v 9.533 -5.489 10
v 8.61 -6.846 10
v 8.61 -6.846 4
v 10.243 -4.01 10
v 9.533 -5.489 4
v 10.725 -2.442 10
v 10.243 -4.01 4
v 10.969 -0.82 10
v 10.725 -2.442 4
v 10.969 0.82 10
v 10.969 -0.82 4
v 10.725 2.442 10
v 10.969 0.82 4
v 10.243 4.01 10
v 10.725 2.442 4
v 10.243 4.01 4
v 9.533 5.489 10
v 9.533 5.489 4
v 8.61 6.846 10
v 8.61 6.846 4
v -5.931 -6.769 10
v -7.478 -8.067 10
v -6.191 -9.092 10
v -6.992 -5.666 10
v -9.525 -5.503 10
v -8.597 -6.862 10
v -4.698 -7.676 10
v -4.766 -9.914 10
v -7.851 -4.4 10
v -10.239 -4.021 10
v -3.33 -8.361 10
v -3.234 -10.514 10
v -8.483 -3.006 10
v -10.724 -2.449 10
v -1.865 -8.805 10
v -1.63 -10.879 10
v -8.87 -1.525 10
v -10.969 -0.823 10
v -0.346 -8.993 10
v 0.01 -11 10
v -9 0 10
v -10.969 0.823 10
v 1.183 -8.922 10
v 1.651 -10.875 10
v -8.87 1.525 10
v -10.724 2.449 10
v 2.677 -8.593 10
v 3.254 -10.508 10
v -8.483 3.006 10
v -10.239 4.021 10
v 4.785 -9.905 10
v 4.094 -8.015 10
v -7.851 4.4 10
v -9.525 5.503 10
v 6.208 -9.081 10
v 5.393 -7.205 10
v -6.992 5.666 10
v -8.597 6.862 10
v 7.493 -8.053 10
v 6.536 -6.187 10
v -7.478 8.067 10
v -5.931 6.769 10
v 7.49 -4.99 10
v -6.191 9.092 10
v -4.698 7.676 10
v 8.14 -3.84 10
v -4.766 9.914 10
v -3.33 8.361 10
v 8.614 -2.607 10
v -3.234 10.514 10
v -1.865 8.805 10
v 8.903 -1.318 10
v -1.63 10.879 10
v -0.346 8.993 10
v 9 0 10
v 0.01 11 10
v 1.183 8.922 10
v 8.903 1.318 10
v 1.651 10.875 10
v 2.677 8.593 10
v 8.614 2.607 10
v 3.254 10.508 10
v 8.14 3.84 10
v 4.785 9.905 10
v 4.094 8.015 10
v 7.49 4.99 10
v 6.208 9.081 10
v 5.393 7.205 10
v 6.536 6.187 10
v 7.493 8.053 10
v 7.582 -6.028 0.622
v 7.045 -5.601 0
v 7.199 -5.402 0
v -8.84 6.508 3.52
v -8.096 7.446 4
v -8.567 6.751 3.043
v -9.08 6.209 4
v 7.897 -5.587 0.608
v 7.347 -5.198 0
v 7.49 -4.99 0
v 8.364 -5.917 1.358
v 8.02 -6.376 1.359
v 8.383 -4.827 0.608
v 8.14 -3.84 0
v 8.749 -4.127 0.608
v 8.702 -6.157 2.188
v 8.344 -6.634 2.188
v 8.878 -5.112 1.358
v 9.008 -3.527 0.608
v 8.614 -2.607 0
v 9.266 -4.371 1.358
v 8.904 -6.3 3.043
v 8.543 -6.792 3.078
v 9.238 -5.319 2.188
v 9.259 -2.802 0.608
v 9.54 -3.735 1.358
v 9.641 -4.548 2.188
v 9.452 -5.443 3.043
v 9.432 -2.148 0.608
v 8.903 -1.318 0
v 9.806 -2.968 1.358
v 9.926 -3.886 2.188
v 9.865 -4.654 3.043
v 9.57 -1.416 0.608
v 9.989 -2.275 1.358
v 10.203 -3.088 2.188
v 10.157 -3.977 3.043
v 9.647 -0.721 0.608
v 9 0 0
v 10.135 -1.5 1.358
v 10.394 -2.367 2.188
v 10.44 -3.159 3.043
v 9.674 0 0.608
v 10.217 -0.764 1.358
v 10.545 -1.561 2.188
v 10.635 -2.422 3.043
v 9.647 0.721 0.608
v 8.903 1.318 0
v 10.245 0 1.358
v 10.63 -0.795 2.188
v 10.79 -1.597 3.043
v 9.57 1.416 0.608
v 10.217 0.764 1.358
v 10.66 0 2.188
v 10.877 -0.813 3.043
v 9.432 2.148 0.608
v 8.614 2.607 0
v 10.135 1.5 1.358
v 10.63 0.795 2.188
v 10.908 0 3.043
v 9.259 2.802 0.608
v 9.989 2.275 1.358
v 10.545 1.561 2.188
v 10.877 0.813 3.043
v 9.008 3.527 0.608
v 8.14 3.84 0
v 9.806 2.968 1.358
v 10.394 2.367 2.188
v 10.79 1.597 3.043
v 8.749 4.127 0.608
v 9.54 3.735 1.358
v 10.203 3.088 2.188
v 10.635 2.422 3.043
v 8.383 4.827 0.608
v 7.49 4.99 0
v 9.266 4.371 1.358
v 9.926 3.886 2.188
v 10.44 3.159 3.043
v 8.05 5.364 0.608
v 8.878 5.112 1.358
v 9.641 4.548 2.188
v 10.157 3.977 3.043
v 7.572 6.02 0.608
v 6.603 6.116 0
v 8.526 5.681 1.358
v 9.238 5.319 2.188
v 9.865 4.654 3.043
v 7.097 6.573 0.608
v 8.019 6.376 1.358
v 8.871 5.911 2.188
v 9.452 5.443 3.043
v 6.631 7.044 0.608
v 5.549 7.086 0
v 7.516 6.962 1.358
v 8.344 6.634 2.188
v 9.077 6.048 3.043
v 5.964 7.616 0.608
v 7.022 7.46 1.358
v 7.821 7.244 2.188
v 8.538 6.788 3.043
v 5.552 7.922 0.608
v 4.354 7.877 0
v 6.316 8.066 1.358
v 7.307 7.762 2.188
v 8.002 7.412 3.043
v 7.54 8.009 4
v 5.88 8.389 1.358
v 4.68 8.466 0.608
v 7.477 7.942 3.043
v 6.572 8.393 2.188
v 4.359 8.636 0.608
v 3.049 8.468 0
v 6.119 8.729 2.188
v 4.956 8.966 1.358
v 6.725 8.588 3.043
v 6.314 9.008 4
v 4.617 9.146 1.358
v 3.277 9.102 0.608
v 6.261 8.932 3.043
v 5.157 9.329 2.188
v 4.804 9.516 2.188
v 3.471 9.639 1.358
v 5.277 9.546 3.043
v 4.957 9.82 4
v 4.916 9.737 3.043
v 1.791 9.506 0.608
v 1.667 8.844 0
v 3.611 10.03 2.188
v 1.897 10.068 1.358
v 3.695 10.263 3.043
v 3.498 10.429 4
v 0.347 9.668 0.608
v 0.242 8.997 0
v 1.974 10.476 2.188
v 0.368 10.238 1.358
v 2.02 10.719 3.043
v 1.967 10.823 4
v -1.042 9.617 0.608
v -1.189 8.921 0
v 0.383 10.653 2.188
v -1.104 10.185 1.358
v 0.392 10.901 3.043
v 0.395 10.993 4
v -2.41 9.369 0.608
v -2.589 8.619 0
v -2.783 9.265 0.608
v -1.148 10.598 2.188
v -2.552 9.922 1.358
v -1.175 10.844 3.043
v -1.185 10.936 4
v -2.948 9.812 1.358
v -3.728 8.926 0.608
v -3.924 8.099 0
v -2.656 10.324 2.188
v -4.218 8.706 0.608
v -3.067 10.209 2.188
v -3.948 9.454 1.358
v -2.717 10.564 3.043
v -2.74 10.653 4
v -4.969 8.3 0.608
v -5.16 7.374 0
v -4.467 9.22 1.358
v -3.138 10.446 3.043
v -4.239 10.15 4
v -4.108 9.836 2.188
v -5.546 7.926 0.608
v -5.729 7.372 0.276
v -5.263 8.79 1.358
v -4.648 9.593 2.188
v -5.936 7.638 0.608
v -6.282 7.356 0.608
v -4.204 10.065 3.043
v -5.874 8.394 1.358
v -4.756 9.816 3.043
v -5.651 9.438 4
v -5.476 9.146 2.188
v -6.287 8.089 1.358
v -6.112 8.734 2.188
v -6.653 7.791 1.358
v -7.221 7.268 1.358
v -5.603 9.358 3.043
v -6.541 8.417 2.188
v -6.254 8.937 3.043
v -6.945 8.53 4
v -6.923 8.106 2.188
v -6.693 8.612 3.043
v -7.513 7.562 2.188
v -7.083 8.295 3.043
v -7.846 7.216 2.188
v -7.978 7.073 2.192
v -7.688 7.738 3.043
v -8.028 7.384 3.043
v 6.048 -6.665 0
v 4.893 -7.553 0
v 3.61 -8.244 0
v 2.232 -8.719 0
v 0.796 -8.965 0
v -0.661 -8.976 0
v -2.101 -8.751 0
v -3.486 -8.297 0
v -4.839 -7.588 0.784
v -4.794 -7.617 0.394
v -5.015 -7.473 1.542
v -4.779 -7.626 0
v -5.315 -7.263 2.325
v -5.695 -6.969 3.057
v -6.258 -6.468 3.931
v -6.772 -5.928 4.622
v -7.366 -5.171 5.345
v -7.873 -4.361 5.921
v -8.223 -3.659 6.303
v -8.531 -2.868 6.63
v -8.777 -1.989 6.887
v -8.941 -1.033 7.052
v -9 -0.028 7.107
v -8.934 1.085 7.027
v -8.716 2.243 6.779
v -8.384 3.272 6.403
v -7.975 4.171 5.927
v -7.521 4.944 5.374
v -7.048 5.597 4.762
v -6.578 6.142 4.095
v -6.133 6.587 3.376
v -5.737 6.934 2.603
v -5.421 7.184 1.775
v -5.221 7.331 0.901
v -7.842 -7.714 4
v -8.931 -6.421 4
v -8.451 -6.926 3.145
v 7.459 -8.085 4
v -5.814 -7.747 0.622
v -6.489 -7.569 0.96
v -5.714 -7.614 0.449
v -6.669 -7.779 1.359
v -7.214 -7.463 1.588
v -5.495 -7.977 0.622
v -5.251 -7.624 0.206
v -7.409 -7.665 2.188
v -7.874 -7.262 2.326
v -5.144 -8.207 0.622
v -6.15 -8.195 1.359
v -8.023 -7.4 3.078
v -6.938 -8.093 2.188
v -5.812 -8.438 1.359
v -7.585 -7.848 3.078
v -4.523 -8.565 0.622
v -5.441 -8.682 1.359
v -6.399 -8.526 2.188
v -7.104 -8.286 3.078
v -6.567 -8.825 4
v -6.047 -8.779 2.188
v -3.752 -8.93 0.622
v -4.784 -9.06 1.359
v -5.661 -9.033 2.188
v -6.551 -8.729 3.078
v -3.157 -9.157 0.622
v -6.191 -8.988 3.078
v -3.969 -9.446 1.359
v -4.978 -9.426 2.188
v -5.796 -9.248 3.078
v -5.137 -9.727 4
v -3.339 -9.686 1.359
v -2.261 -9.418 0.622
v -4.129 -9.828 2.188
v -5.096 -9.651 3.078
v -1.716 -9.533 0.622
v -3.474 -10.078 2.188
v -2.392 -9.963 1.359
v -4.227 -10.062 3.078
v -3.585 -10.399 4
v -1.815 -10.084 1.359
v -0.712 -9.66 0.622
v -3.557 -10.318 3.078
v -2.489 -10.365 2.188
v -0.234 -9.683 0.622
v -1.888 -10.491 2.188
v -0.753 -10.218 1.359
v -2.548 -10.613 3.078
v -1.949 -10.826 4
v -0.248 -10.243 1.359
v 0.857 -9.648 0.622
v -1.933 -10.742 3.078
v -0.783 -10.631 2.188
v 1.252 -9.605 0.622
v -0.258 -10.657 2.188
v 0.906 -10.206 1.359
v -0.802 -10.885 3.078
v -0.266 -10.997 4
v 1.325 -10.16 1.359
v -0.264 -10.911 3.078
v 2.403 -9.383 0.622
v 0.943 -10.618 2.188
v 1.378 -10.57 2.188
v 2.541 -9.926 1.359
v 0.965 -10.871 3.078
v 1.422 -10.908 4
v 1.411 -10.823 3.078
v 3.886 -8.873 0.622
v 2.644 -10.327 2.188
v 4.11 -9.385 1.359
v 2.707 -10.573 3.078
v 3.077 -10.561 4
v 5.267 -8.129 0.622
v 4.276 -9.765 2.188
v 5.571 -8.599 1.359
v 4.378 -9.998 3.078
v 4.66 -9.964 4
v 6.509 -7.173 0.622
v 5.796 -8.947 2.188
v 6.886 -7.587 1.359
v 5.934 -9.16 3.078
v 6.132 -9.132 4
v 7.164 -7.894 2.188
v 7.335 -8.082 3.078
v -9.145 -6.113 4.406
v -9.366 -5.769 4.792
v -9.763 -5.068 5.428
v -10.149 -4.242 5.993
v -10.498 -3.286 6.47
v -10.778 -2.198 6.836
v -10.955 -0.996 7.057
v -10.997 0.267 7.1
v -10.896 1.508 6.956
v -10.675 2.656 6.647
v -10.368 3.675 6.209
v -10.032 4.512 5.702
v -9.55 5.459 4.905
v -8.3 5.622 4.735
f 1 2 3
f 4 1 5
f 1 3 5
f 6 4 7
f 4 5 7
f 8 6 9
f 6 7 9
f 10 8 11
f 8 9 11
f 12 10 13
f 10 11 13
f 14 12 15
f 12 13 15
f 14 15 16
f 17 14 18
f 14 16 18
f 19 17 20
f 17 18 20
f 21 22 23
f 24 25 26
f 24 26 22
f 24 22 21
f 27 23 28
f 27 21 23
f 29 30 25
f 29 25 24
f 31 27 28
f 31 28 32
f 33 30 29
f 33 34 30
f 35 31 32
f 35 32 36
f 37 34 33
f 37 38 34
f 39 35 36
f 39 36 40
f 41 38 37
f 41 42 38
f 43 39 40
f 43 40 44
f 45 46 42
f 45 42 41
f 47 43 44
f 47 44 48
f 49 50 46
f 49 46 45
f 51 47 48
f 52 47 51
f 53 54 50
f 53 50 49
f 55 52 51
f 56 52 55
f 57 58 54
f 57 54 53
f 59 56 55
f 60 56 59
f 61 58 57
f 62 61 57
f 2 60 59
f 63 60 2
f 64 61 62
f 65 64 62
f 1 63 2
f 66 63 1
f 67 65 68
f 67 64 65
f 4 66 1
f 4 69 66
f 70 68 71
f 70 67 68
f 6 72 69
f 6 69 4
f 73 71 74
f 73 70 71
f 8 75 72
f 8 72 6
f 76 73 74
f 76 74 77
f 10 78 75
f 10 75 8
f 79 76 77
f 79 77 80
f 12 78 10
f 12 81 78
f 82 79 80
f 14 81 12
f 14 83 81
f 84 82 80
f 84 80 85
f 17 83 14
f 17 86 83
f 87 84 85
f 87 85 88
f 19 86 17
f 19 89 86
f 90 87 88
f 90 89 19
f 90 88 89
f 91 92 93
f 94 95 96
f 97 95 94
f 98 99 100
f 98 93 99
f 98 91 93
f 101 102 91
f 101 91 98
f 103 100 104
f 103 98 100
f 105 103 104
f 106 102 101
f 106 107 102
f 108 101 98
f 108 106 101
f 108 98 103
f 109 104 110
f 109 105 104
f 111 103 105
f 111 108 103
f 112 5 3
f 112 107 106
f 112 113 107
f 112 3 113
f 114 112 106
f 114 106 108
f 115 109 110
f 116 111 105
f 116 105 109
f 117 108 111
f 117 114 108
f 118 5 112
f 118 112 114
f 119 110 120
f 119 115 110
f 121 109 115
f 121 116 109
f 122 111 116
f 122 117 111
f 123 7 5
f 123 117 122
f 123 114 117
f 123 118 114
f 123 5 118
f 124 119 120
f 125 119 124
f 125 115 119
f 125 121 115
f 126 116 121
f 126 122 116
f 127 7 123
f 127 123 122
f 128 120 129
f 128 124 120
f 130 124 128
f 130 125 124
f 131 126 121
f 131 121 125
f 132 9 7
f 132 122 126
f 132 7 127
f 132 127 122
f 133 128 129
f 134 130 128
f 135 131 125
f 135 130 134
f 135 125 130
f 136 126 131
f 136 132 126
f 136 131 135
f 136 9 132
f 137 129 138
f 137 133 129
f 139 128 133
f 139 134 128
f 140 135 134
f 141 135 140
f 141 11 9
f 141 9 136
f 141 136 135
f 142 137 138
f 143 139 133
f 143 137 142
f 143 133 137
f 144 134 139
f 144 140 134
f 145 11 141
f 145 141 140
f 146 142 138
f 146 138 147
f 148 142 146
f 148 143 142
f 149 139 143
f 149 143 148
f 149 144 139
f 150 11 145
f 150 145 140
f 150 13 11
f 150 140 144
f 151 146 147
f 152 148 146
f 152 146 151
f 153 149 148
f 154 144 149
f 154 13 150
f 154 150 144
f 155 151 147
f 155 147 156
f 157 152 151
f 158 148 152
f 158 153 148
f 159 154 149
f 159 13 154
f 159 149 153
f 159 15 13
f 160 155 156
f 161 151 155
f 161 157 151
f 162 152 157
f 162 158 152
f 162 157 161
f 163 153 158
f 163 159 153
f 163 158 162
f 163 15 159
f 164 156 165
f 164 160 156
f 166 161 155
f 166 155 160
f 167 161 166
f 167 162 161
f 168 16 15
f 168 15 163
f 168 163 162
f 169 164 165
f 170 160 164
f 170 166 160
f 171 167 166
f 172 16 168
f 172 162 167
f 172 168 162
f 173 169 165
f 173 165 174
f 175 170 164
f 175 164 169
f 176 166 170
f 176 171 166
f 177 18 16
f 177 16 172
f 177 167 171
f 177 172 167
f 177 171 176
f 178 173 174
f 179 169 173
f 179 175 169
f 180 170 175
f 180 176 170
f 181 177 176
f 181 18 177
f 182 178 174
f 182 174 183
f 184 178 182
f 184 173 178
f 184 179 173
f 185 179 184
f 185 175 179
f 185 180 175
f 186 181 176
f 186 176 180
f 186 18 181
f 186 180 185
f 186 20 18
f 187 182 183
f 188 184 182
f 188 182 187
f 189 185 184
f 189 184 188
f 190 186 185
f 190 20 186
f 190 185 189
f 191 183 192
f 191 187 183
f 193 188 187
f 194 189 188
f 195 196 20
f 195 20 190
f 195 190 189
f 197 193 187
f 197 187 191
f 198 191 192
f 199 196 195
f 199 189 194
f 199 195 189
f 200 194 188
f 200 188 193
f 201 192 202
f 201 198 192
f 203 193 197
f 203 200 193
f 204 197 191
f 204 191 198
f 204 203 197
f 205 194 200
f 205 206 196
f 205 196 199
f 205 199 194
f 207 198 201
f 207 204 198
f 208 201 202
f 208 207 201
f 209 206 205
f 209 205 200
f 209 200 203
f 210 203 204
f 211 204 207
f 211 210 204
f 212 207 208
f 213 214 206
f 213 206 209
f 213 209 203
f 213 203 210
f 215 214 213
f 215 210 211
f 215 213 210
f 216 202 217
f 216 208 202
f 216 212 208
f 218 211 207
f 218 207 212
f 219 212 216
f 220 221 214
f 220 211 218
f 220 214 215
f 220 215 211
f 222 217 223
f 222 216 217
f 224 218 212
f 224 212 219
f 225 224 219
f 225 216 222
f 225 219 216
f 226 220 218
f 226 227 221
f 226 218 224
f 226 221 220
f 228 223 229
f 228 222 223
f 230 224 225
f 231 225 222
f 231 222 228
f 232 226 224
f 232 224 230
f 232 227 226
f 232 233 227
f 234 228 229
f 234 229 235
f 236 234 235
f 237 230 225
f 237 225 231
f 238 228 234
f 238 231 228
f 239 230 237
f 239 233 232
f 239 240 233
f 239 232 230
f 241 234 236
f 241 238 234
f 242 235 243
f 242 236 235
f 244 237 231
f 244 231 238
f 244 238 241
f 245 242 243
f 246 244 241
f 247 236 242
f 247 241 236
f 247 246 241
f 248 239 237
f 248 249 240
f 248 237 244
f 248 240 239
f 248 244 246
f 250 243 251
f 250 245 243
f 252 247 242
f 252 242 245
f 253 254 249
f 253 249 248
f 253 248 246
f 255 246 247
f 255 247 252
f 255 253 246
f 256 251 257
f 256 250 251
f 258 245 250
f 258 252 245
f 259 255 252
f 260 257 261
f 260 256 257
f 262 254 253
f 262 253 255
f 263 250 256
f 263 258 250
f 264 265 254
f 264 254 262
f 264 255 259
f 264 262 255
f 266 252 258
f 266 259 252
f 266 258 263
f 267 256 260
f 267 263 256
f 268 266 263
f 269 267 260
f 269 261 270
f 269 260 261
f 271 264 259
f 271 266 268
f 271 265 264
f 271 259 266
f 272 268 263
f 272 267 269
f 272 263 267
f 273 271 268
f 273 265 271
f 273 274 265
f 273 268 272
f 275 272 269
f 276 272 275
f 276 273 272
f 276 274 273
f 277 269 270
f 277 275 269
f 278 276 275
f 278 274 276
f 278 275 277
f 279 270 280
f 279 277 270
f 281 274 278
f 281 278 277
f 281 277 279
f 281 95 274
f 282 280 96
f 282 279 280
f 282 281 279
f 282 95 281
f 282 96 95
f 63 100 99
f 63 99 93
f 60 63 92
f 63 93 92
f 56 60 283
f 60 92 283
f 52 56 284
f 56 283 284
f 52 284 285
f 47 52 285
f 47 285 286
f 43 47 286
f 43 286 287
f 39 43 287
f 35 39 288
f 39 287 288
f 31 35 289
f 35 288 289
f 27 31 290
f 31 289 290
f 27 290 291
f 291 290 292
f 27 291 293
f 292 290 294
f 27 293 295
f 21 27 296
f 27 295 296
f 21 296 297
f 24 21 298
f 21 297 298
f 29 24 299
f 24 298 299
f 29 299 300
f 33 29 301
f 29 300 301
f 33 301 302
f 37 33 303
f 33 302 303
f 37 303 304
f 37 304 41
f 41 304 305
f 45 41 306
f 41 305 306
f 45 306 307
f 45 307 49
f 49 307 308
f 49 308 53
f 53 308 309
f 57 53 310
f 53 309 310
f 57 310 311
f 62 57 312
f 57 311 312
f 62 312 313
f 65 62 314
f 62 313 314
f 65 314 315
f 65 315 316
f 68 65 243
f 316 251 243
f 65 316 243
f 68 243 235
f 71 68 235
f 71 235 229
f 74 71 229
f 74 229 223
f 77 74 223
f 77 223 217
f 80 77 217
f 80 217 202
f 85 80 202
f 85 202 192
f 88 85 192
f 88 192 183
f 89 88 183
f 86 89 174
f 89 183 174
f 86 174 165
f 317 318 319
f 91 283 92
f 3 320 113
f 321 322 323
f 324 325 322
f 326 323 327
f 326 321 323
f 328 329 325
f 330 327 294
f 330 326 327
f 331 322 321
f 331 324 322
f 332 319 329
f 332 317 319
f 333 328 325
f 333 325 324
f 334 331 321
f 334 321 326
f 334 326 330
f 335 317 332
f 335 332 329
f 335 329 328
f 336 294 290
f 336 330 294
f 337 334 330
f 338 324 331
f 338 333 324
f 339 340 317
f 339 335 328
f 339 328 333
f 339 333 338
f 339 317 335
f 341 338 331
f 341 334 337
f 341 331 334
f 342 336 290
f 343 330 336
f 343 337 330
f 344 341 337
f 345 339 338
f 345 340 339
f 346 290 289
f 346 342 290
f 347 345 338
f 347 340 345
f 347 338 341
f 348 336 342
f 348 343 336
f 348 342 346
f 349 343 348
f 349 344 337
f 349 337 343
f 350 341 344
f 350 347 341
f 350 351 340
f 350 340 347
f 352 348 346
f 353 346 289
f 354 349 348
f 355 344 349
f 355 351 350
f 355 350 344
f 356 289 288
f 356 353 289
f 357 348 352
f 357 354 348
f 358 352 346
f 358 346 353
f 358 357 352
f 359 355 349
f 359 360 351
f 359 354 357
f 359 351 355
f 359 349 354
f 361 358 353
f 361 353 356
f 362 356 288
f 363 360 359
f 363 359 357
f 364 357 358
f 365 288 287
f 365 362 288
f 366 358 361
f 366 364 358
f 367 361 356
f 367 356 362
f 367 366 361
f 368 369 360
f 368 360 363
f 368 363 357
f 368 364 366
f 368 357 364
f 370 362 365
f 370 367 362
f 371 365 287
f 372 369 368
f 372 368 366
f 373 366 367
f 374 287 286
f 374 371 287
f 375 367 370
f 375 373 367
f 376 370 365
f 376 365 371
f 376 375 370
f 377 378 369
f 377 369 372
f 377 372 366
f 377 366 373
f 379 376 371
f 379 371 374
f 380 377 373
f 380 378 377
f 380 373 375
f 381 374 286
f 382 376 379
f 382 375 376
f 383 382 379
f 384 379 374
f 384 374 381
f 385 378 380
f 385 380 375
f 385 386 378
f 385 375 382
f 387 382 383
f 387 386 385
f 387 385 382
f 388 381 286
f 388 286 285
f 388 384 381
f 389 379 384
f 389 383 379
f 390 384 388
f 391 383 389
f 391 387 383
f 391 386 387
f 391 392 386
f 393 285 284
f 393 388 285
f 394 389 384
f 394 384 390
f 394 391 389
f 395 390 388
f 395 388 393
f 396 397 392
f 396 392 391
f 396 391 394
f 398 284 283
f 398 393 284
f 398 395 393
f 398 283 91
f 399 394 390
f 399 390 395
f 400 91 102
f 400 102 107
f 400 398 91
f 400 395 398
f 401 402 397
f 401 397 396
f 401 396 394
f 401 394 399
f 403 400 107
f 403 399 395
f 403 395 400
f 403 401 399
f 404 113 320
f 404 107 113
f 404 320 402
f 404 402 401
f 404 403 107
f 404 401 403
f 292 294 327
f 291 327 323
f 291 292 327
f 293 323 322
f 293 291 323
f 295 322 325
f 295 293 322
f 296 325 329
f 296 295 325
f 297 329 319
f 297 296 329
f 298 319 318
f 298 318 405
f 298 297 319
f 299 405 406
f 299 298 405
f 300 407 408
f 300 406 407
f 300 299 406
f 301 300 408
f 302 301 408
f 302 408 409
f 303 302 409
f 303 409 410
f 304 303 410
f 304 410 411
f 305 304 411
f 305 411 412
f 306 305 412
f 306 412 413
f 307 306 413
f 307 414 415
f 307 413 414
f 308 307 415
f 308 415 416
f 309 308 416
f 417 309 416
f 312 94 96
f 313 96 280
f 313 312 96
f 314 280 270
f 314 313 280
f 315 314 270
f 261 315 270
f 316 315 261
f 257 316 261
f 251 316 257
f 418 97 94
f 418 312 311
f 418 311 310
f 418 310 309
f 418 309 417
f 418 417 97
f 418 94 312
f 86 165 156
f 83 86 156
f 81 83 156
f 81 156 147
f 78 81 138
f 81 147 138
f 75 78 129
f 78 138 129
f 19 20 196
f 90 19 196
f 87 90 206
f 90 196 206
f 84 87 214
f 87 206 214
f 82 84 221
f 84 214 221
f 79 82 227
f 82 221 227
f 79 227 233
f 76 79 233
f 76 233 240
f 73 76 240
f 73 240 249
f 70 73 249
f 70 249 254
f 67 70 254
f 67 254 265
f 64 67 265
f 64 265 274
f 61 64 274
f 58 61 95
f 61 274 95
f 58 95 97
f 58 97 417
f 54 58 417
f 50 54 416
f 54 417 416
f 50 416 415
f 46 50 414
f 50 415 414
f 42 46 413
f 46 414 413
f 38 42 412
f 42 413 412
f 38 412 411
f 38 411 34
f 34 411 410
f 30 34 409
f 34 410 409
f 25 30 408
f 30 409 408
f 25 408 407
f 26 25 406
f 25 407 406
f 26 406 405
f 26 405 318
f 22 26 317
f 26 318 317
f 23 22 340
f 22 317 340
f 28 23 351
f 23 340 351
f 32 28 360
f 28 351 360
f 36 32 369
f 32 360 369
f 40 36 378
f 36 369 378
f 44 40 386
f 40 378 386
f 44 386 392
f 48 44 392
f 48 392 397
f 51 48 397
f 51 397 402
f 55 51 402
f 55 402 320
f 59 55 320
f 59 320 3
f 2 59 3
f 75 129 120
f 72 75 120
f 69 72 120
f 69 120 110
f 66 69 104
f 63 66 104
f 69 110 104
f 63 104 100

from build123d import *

# Parameters (mm, degrees)
F1_DEPTH    = 10
F3_DEPTH    = 25
F4_DEPTH    = 25
F5_T2_ANGLE = 228.5604314435
F5_T4_ANGLE = 149.7338838055


# Not quite as in the source:
# - a fillet or chamfer that OpenCascade refuses, or shapes differently, is made with other operations: its cross-section is extruded or revolved along the edge and cut away or added


with BuildPart() as f1:
    # F0 (on Top) → F1 (new body)
    with BuildSketch(Plane.XY):
        with BuildLine():
            ThreePointArc((7.4897676428, -4.9903287123), (-9, 0), (7.4897676428, 4.9903287123))
            ThreePointArc((7.4897676428, 4.9903287123), (8.0061615463, 5.944514107), (8.6101788512, 6.8457884973))
            ThreePointArc((8.6101788512, 6.8457884973), (-11, 0), (8.6101788512, -6.8457884973))
            ThreePointArc((8.6101788512, -6.8457884973), (8.0061615463, -5.944514107), (7.4897676428, -4.9903287123))
        make_face()
        with BuildLine():
            ThreePointArc((7.4897676428, 4.9903287123), (8.6141717183, 2.6069226316), (9, 0))
            ThreePointArc((9, 0), (8.6141717183, -2.6069226316), (7.4897676428, -4.9903287123))
            ThreePointArc((7.4897676428, -4.9903287123), (8.0061615463, -5.944514107), (8.6101788512, -6.8457884973))
            ThreePointArc((8.6101788512, -6.8457884973), (11, 0), (8.6101788512, 6.8457884973))
            ThreePointArc((8.6101788512, 6.8457884973), (8.0061615463, 5.944514107), (7.4897676428, 4.9903287123))
        make_face()
    extrude(amount=F1_DEPTH)

    # F2 (on Right) → F3 (cut)
    with BuildSketch(Plane.YZ):
        with BuildLine():
            add(Edge.make_bspline(
                [(-7.6260738851, 0), (-7.6289822236, 4.6128164915), (0.0415342584, 9.6458716707), (7.41270182, 4.5238972991), (7.3739261149, 0)],
                knots=[0, 0, 0, 0, 0.502214143, 1, 1, 1, 1], degree=3))
            Line((-7.6260738851, 0), (7.3739261149, 0))
        make_face()
    extrude(amount=-F3_DEPTH, mode=Mode.SUBTRACT)

    # F2 (on Right) → F4 (cut)
    with BuildSketch(Plane.YZ):
        with BuildLine():
            add(Edge.make_bspline(
                [(-7.6260738851, 0), (-7.6289822236, 4.6128164915), (0.0415342584, 9.6458716707), (7.41270182, 4.5238972991), (7.3739261149, 0)],
                knots=[0, 0, 0, 0, 0.502214143, 1, 1, 1, 1], degree=3))
            Line((-7.6260738851, 0), (7.3739261149, 0))
        make_face()
    extrude(amount=-F4_DEPTH, mode=Mode.SUBTRACT)

    # F5: fillet of radius 5 on 2 edges, made by hand

    # F5_s1 → F5_t2 (revolve, cut)
    with BuildSketch(Plane(origin=(0, 0, 0), x_dir=(0, 0, 1), z_dir=(-0.6223444088, -0.7827435319, 0))):
        with BuildLine():
            ThreePointArc((0, -9), (1.7639320225, -10.472135955), (4, -11))
            Line((4, -11), (0, -11))
            Line((0, -11), (0, -9))
        make_face()
    revolve(axis=Axis((0, 0, 0), (0, 0, 1)), revolution_arc=F5_T2_ANGLE, mode=Mode.SUBTRACT)

    # F5_s3 → F5_t4 (revolve, cut)
    with BuildSketch(Plane(origin=(0, 0, 0), x_dir=(0, 0, 1), z_dir=(0.1429989905, 0.9897228343, 0))):
        with BuildLine():
            ThreePointArc((0, -9), (1.7639320225, -10.472135955), (4, -11))
            Line((4, -11), (0, -11))
            Line((0, -11), (0, -9))
        make_face()
    revolve(axis=Axis((0, 0, 0), (0, 0, 1)), revolution_arc=F5_T4_ANGLE, mode=Mode.SUBTRACT)


solid = f1.part
